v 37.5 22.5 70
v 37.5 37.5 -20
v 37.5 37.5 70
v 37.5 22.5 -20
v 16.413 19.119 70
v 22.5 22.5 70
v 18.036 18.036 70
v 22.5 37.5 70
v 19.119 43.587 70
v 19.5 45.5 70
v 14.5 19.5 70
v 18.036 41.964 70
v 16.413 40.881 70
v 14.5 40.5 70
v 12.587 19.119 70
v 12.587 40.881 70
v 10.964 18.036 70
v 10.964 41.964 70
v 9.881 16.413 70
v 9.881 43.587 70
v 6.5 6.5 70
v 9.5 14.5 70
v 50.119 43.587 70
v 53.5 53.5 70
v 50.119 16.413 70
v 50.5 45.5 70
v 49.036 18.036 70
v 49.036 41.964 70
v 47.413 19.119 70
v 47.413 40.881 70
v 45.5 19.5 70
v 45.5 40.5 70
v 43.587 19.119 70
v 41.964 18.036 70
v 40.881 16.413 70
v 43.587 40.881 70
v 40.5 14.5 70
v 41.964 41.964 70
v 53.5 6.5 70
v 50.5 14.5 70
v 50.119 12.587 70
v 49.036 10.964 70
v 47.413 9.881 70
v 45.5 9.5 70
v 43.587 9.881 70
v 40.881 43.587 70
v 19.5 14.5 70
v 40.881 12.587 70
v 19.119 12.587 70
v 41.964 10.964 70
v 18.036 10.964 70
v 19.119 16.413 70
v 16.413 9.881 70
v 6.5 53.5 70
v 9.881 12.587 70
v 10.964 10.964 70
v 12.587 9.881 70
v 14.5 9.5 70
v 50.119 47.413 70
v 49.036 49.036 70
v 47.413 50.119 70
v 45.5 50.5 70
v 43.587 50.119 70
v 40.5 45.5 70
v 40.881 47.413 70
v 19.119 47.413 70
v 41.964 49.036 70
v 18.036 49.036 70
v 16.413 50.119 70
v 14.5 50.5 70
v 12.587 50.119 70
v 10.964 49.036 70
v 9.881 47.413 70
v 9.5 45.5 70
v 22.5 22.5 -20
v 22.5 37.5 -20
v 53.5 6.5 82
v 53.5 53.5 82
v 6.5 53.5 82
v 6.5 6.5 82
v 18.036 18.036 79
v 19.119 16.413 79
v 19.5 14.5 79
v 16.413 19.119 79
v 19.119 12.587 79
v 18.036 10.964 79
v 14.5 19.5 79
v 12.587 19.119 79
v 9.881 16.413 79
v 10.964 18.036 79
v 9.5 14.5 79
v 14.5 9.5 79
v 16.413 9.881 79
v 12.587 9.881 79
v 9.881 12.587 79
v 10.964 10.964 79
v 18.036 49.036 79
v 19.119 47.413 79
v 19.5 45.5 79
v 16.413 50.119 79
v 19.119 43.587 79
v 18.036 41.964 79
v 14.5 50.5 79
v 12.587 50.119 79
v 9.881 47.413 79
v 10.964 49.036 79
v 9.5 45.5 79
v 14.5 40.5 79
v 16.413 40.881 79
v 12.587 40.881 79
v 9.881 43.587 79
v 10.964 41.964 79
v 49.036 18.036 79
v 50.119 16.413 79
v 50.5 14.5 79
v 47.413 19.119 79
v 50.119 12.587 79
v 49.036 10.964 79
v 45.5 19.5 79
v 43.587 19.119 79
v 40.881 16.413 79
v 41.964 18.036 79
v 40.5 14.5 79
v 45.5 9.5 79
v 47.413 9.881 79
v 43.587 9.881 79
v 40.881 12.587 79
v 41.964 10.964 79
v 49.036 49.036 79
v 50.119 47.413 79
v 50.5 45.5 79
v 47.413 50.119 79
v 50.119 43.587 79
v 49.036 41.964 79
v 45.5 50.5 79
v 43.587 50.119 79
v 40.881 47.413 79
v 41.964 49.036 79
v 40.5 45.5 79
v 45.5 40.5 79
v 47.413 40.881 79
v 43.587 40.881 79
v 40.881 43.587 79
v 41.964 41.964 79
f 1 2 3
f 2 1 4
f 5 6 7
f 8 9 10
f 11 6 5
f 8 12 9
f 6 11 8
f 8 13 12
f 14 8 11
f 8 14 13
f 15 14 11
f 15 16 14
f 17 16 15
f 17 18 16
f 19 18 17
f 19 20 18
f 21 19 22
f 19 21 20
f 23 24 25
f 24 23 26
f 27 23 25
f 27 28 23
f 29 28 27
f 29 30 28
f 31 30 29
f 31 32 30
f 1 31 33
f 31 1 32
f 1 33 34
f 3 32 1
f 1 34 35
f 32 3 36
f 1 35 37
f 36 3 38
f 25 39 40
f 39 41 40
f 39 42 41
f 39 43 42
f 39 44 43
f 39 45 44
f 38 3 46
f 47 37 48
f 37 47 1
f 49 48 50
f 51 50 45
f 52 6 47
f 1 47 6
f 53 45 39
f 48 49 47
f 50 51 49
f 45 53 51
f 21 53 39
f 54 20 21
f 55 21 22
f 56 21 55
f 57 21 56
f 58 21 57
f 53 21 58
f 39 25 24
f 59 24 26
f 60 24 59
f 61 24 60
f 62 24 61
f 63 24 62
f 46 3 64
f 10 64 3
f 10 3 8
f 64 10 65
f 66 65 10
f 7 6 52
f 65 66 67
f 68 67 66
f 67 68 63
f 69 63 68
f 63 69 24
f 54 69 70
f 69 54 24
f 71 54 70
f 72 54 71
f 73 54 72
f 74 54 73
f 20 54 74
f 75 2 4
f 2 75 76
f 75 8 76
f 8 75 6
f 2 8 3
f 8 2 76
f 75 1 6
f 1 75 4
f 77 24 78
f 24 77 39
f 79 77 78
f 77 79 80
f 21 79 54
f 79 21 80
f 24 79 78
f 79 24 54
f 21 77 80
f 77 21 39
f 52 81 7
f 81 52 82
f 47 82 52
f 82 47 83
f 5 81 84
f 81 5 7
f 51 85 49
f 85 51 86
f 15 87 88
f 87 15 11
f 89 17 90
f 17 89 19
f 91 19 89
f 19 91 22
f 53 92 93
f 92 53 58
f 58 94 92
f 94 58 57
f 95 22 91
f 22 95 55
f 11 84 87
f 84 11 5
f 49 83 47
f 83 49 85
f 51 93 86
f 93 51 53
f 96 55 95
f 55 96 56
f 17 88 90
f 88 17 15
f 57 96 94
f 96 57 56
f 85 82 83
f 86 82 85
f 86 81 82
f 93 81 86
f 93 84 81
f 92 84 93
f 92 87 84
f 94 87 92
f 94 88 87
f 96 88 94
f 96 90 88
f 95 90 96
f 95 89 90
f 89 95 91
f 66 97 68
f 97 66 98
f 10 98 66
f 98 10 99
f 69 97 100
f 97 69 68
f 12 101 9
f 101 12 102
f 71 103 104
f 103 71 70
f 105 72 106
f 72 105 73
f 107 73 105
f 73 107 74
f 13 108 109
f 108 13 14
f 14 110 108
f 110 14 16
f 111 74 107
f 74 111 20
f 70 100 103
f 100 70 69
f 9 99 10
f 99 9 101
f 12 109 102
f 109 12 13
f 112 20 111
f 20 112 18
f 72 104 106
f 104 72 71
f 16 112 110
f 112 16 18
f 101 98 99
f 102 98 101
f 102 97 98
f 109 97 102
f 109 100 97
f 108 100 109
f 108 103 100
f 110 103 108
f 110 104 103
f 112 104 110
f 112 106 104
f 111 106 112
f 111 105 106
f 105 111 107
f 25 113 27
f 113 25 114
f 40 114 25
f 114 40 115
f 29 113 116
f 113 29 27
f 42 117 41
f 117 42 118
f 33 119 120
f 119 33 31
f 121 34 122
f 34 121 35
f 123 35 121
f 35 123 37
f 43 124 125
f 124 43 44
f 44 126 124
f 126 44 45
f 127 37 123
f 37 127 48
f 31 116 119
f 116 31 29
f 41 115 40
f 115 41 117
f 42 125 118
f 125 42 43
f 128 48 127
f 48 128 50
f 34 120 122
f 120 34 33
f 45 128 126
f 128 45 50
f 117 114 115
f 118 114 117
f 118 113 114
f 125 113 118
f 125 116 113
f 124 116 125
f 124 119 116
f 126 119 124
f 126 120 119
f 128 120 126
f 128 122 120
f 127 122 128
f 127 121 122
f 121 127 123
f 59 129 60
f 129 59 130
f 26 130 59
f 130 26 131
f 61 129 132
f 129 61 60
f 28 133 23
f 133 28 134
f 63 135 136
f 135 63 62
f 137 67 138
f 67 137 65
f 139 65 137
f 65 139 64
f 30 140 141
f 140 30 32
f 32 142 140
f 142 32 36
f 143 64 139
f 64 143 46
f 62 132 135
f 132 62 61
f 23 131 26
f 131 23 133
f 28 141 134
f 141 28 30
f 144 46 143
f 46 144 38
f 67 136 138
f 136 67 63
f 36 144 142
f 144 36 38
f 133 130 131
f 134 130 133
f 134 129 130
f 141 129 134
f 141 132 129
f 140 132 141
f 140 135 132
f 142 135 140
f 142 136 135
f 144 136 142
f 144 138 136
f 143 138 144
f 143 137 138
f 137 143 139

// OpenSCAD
module magnetHole(){
    translate([5,5,0])cylinder(r=5,h=9);
}

module lock(w,l,n,s){
    difference(){
        cube([w,w,l]);
        translate([w*3/8-s,w*3/8-s,0]) cube([w/4+2*s,w/4+2*s, n]);//neck
        translate([w*5/8-2*s,w*3/8-s,0]) cube([w*3/4+3*s,w/4+2*s,n+24]);//neck slot
        translate([w*3/8-16-s,w*3/8-16-s,n]) cube([w/4+32+2*s,w/4+32+2*s,12]);//head
        translate([w*3/8-16-s,w*3/8-16-s,n+12]) cube([w*3/4+32+2*s,w/4+32+2*s,60]);//head slot
      //Magnets
        translate([w*3/8-13,w*3/8-13,n-9]) magnetHole();
        translate([w*3/8-13,w*5/8+3,n-9]) magnetHole();
        translate([w*5/8+3,w*3/8-13,n-9]) magnetHole();
        translate([w*5/8+3,w*5/8+3,n-9]) magnetHole();
    }
}
module key(w,l,n,s){
    difference(){
    union(){
        translate([w*3/8,w*3/8,-20]) cube([w/4,w/4, n+20]);//neck
        translate([w*3/8-16,w*3/8-16,n]) cube([w/4+32,w/4+32,12]);//head
    }
        //Magnets
        translate([w*3/8-13,w*3/8-13,n]) magnetHole();
        translate([w*3/8-13,w*5/8+3,n]) magnetHole();
        translate([w*5/8+3,w*3/8-13,n]) magnetHole();
        translate([w*5/8+3,w*5/8+3,n]) magnetHole();
    }
}

module model(w,l,n,s){
    lock(w,l,n,s);
    key(w,l,n,s);
}


key(60,98,70,1.5);
